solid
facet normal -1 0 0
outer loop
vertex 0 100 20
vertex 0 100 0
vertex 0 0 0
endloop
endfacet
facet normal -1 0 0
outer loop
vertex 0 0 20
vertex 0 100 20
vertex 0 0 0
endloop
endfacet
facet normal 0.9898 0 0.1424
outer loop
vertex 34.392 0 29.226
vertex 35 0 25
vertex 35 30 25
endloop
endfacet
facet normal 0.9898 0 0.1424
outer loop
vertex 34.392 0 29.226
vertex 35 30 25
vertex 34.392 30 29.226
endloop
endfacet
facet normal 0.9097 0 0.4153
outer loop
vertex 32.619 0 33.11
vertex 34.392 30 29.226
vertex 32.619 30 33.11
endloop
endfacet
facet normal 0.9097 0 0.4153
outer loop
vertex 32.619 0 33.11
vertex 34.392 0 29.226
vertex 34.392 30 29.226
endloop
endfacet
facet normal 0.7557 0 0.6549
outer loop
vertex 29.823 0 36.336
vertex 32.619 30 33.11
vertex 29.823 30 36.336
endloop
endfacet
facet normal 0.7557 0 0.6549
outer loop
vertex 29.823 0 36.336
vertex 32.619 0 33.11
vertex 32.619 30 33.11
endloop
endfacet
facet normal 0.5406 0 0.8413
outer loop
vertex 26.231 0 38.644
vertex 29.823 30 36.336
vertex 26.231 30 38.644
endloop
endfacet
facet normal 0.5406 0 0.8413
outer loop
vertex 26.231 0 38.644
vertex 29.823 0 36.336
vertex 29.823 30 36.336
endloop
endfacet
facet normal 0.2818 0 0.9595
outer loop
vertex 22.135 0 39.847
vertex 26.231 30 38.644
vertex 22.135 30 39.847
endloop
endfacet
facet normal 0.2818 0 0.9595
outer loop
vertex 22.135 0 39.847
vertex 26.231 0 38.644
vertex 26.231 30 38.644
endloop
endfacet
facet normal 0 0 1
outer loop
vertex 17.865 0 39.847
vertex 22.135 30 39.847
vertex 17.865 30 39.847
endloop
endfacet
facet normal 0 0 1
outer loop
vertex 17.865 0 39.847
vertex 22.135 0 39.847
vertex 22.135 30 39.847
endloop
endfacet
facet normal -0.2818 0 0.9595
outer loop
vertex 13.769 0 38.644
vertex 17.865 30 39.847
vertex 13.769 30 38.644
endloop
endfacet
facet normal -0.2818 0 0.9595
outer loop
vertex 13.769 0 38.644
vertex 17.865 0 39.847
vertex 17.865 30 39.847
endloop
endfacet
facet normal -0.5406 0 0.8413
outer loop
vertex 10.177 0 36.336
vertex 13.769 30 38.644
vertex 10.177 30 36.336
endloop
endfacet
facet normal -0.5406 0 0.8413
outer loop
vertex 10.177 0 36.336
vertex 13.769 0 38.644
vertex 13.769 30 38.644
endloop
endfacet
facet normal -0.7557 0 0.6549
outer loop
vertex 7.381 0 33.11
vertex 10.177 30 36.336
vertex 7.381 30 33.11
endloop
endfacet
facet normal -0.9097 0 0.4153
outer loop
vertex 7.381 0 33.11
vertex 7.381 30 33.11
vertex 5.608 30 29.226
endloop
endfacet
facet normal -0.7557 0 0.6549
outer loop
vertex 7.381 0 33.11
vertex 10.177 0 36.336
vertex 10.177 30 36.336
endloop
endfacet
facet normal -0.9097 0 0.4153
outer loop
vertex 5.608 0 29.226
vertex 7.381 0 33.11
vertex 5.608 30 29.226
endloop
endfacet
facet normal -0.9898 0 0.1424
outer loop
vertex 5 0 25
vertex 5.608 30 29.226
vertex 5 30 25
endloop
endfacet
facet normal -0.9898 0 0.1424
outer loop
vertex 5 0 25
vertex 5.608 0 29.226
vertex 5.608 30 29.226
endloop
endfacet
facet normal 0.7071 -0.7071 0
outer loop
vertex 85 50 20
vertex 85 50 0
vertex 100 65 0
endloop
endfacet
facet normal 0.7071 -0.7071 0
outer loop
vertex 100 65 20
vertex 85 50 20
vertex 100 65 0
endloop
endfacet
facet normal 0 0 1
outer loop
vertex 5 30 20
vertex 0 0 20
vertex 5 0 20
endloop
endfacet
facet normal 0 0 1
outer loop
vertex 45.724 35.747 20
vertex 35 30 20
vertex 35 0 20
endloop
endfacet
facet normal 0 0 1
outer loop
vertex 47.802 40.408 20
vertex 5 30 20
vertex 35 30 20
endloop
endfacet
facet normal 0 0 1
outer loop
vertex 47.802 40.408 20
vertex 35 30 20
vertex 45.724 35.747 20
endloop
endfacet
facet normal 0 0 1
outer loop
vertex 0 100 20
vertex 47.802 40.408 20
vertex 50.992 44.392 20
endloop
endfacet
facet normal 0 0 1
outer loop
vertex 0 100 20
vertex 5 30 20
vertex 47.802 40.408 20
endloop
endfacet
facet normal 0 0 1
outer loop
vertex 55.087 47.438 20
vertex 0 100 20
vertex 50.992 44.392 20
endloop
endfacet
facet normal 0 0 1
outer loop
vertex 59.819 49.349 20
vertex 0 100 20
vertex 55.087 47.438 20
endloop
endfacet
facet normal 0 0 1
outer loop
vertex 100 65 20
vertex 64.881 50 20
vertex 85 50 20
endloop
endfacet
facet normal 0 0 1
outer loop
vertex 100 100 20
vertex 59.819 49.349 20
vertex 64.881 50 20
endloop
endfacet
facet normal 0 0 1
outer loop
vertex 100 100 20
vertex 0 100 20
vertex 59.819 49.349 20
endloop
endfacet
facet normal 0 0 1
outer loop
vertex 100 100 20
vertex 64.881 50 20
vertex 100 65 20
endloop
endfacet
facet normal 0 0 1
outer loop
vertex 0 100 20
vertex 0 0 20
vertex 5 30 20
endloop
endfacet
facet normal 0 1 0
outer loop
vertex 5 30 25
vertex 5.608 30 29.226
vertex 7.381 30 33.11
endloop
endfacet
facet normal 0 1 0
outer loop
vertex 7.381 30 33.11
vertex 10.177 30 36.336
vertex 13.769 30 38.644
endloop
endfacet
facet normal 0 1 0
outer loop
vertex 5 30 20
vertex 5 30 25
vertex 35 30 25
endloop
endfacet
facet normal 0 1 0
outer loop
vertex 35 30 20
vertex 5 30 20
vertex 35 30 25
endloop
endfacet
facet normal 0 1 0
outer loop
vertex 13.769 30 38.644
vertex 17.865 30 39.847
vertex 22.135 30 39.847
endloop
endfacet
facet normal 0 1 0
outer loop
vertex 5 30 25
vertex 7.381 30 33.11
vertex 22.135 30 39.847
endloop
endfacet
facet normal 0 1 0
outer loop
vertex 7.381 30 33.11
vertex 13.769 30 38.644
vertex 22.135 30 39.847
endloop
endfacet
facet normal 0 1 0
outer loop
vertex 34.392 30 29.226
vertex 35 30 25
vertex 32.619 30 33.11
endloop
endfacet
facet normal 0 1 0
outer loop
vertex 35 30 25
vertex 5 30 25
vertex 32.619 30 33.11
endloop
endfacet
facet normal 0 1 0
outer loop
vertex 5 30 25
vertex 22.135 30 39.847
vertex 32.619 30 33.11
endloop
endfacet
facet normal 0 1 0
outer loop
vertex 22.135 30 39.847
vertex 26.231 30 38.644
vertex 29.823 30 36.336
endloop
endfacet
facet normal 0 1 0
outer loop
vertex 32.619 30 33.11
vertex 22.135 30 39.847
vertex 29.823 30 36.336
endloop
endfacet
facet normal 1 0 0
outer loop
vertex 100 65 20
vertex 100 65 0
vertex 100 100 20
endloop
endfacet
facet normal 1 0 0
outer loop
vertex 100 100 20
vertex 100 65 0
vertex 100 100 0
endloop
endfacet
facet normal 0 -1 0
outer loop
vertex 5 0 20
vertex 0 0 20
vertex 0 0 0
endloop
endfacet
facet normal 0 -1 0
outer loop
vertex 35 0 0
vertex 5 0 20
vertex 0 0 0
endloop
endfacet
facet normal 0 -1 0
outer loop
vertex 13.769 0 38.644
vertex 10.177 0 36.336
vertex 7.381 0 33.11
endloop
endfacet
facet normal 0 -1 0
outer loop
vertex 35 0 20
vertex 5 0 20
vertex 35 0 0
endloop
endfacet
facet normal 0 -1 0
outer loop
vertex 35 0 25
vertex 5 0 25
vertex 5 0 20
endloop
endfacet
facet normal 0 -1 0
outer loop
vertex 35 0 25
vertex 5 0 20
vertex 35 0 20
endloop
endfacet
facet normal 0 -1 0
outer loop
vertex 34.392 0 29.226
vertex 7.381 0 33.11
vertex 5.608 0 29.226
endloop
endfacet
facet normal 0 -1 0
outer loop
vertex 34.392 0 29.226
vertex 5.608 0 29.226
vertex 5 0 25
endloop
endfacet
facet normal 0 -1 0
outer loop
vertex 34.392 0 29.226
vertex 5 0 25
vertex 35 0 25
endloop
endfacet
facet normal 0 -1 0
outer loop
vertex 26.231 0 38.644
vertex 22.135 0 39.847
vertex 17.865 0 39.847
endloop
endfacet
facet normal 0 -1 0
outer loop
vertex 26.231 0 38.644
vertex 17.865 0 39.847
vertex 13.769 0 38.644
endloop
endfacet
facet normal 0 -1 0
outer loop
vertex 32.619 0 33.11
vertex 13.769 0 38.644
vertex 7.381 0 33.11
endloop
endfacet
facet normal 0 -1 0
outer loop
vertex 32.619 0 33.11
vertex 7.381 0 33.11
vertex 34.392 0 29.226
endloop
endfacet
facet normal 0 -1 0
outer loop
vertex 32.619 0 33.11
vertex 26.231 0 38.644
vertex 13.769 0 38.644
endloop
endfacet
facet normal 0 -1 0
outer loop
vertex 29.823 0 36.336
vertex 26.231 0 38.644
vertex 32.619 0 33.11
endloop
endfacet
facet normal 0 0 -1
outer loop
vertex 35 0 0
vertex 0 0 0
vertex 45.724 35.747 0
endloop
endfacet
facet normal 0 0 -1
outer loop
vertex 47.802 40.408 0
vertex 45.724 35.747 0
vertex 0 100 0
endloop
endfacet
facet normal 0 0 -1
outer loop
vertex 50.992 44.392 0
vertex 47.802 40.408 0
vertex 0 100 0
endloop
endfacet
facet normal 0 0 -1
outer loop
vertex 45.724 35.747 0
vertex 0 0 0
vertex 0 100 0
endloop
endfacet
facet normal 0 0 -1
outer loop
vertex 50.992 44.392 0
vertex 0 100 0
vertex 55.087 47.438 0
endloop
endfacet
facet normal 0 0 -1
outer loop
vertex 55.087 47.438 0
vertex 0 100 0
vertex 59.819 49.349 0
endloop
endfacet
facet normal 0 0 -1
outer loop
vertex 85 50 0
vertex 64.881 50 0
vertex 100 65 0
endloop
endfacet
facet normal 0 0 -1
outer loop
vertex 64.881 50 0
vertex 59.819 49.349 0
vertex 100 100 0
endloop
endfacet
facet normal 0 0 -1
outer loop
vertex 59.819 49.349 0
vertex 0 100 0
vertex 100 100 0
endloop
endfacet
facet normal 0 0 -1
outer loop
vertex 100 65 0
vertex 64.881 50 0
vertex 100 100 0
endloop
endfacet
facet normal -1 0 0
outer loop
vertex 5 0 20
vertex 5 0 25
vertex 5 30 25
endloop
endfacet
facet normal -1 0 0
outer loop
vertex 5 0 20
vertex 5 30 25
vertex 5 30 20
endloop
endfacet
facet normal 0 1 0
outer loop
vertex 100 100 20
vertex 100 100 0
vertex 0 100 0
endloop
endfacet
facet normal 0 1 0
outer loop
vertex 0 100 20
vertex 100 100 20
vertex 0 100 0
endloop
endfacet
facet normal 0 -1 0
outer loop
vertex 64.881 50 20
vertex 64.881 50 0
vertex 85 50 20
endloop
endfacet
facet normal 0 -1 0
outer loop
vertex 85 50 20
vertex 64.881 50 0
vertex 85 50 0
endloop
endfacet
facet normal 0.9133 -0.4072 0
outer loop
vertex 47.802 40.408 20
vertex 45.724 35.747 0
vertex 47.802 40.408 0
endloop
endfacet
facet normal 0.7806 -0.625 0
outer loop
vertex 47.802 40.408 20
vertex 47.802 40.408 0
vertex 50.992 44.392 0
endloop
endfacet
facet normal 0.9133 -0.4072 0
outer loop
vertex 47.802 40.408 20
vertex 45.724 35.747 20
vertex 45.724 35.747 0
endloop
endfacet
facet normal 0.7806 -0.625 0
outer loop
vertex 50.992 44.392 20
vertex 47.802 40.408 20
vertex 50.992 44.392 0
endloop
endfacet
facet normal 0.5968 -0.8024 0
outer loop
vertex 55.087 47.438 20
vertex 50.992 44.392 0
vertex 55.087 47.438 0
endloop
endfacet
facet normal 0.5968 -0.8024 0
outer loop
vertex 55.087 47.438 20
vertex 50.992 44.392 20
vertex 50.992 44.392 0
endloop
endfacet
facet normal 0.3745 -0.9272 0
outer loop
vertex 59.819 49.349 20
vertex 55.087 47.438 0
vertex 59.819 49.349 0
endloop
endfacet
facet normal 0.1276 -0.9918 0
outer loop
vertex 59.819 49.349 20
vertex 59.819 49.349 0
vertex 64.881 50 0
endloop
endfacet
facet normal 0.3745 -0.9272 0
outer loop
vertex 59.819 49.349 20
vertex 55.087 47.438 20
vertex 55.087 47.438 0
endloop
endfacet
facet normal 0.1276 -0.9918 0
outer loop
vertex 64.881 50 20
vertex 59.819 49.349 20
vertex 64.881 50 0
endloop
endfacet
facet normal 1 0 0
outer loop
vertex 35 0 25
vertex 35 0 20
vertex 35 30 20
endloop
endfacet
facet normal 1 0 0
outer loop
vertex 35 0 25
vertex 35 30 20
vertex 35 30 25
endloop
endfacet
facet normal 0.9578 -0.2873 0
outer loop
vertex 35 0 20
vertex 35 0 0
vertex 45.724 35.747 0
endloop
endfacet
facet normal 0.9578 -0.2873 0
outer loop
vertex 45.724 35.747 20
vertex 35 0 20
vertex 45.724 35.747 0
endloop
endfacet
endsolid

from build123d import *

# Parameters (mm, degrees)
F1_DEPTH = 20
F2_R     = 20
F4_DEPTH = 30


with BuildPart() as f1:
    # F0 (on Top) → F1 (new body)
    with BuildSketch(Plane.XY):
        Polygon((0, 100), (0, 0), (35, 0), (50, 50), (85, 50), (100, 65), (100, 100), align=None)
    extrude(amount=F1_DEPTH)

    # F2
    f2_edges = [f1.edges().sort_by_distance(p)[0] for p in [
        (50, 50, 10),
    ]]
    fillet(f2_edges, radius=F2_R)

    # F3 (on face) → F4 (join)
    with BuildSketch(Plane.XZ):
        with BuildLine():
            Line((35, 20), (35, 25))
            ThreePointArc((35, 25), (20, 40), (5, 25))
            Line((5, 25), (5, 20))
            Line((5, 20), (35, 20))
        make_face()
    extrude(amount=-F4_DEPTH)


solid = f1.part
